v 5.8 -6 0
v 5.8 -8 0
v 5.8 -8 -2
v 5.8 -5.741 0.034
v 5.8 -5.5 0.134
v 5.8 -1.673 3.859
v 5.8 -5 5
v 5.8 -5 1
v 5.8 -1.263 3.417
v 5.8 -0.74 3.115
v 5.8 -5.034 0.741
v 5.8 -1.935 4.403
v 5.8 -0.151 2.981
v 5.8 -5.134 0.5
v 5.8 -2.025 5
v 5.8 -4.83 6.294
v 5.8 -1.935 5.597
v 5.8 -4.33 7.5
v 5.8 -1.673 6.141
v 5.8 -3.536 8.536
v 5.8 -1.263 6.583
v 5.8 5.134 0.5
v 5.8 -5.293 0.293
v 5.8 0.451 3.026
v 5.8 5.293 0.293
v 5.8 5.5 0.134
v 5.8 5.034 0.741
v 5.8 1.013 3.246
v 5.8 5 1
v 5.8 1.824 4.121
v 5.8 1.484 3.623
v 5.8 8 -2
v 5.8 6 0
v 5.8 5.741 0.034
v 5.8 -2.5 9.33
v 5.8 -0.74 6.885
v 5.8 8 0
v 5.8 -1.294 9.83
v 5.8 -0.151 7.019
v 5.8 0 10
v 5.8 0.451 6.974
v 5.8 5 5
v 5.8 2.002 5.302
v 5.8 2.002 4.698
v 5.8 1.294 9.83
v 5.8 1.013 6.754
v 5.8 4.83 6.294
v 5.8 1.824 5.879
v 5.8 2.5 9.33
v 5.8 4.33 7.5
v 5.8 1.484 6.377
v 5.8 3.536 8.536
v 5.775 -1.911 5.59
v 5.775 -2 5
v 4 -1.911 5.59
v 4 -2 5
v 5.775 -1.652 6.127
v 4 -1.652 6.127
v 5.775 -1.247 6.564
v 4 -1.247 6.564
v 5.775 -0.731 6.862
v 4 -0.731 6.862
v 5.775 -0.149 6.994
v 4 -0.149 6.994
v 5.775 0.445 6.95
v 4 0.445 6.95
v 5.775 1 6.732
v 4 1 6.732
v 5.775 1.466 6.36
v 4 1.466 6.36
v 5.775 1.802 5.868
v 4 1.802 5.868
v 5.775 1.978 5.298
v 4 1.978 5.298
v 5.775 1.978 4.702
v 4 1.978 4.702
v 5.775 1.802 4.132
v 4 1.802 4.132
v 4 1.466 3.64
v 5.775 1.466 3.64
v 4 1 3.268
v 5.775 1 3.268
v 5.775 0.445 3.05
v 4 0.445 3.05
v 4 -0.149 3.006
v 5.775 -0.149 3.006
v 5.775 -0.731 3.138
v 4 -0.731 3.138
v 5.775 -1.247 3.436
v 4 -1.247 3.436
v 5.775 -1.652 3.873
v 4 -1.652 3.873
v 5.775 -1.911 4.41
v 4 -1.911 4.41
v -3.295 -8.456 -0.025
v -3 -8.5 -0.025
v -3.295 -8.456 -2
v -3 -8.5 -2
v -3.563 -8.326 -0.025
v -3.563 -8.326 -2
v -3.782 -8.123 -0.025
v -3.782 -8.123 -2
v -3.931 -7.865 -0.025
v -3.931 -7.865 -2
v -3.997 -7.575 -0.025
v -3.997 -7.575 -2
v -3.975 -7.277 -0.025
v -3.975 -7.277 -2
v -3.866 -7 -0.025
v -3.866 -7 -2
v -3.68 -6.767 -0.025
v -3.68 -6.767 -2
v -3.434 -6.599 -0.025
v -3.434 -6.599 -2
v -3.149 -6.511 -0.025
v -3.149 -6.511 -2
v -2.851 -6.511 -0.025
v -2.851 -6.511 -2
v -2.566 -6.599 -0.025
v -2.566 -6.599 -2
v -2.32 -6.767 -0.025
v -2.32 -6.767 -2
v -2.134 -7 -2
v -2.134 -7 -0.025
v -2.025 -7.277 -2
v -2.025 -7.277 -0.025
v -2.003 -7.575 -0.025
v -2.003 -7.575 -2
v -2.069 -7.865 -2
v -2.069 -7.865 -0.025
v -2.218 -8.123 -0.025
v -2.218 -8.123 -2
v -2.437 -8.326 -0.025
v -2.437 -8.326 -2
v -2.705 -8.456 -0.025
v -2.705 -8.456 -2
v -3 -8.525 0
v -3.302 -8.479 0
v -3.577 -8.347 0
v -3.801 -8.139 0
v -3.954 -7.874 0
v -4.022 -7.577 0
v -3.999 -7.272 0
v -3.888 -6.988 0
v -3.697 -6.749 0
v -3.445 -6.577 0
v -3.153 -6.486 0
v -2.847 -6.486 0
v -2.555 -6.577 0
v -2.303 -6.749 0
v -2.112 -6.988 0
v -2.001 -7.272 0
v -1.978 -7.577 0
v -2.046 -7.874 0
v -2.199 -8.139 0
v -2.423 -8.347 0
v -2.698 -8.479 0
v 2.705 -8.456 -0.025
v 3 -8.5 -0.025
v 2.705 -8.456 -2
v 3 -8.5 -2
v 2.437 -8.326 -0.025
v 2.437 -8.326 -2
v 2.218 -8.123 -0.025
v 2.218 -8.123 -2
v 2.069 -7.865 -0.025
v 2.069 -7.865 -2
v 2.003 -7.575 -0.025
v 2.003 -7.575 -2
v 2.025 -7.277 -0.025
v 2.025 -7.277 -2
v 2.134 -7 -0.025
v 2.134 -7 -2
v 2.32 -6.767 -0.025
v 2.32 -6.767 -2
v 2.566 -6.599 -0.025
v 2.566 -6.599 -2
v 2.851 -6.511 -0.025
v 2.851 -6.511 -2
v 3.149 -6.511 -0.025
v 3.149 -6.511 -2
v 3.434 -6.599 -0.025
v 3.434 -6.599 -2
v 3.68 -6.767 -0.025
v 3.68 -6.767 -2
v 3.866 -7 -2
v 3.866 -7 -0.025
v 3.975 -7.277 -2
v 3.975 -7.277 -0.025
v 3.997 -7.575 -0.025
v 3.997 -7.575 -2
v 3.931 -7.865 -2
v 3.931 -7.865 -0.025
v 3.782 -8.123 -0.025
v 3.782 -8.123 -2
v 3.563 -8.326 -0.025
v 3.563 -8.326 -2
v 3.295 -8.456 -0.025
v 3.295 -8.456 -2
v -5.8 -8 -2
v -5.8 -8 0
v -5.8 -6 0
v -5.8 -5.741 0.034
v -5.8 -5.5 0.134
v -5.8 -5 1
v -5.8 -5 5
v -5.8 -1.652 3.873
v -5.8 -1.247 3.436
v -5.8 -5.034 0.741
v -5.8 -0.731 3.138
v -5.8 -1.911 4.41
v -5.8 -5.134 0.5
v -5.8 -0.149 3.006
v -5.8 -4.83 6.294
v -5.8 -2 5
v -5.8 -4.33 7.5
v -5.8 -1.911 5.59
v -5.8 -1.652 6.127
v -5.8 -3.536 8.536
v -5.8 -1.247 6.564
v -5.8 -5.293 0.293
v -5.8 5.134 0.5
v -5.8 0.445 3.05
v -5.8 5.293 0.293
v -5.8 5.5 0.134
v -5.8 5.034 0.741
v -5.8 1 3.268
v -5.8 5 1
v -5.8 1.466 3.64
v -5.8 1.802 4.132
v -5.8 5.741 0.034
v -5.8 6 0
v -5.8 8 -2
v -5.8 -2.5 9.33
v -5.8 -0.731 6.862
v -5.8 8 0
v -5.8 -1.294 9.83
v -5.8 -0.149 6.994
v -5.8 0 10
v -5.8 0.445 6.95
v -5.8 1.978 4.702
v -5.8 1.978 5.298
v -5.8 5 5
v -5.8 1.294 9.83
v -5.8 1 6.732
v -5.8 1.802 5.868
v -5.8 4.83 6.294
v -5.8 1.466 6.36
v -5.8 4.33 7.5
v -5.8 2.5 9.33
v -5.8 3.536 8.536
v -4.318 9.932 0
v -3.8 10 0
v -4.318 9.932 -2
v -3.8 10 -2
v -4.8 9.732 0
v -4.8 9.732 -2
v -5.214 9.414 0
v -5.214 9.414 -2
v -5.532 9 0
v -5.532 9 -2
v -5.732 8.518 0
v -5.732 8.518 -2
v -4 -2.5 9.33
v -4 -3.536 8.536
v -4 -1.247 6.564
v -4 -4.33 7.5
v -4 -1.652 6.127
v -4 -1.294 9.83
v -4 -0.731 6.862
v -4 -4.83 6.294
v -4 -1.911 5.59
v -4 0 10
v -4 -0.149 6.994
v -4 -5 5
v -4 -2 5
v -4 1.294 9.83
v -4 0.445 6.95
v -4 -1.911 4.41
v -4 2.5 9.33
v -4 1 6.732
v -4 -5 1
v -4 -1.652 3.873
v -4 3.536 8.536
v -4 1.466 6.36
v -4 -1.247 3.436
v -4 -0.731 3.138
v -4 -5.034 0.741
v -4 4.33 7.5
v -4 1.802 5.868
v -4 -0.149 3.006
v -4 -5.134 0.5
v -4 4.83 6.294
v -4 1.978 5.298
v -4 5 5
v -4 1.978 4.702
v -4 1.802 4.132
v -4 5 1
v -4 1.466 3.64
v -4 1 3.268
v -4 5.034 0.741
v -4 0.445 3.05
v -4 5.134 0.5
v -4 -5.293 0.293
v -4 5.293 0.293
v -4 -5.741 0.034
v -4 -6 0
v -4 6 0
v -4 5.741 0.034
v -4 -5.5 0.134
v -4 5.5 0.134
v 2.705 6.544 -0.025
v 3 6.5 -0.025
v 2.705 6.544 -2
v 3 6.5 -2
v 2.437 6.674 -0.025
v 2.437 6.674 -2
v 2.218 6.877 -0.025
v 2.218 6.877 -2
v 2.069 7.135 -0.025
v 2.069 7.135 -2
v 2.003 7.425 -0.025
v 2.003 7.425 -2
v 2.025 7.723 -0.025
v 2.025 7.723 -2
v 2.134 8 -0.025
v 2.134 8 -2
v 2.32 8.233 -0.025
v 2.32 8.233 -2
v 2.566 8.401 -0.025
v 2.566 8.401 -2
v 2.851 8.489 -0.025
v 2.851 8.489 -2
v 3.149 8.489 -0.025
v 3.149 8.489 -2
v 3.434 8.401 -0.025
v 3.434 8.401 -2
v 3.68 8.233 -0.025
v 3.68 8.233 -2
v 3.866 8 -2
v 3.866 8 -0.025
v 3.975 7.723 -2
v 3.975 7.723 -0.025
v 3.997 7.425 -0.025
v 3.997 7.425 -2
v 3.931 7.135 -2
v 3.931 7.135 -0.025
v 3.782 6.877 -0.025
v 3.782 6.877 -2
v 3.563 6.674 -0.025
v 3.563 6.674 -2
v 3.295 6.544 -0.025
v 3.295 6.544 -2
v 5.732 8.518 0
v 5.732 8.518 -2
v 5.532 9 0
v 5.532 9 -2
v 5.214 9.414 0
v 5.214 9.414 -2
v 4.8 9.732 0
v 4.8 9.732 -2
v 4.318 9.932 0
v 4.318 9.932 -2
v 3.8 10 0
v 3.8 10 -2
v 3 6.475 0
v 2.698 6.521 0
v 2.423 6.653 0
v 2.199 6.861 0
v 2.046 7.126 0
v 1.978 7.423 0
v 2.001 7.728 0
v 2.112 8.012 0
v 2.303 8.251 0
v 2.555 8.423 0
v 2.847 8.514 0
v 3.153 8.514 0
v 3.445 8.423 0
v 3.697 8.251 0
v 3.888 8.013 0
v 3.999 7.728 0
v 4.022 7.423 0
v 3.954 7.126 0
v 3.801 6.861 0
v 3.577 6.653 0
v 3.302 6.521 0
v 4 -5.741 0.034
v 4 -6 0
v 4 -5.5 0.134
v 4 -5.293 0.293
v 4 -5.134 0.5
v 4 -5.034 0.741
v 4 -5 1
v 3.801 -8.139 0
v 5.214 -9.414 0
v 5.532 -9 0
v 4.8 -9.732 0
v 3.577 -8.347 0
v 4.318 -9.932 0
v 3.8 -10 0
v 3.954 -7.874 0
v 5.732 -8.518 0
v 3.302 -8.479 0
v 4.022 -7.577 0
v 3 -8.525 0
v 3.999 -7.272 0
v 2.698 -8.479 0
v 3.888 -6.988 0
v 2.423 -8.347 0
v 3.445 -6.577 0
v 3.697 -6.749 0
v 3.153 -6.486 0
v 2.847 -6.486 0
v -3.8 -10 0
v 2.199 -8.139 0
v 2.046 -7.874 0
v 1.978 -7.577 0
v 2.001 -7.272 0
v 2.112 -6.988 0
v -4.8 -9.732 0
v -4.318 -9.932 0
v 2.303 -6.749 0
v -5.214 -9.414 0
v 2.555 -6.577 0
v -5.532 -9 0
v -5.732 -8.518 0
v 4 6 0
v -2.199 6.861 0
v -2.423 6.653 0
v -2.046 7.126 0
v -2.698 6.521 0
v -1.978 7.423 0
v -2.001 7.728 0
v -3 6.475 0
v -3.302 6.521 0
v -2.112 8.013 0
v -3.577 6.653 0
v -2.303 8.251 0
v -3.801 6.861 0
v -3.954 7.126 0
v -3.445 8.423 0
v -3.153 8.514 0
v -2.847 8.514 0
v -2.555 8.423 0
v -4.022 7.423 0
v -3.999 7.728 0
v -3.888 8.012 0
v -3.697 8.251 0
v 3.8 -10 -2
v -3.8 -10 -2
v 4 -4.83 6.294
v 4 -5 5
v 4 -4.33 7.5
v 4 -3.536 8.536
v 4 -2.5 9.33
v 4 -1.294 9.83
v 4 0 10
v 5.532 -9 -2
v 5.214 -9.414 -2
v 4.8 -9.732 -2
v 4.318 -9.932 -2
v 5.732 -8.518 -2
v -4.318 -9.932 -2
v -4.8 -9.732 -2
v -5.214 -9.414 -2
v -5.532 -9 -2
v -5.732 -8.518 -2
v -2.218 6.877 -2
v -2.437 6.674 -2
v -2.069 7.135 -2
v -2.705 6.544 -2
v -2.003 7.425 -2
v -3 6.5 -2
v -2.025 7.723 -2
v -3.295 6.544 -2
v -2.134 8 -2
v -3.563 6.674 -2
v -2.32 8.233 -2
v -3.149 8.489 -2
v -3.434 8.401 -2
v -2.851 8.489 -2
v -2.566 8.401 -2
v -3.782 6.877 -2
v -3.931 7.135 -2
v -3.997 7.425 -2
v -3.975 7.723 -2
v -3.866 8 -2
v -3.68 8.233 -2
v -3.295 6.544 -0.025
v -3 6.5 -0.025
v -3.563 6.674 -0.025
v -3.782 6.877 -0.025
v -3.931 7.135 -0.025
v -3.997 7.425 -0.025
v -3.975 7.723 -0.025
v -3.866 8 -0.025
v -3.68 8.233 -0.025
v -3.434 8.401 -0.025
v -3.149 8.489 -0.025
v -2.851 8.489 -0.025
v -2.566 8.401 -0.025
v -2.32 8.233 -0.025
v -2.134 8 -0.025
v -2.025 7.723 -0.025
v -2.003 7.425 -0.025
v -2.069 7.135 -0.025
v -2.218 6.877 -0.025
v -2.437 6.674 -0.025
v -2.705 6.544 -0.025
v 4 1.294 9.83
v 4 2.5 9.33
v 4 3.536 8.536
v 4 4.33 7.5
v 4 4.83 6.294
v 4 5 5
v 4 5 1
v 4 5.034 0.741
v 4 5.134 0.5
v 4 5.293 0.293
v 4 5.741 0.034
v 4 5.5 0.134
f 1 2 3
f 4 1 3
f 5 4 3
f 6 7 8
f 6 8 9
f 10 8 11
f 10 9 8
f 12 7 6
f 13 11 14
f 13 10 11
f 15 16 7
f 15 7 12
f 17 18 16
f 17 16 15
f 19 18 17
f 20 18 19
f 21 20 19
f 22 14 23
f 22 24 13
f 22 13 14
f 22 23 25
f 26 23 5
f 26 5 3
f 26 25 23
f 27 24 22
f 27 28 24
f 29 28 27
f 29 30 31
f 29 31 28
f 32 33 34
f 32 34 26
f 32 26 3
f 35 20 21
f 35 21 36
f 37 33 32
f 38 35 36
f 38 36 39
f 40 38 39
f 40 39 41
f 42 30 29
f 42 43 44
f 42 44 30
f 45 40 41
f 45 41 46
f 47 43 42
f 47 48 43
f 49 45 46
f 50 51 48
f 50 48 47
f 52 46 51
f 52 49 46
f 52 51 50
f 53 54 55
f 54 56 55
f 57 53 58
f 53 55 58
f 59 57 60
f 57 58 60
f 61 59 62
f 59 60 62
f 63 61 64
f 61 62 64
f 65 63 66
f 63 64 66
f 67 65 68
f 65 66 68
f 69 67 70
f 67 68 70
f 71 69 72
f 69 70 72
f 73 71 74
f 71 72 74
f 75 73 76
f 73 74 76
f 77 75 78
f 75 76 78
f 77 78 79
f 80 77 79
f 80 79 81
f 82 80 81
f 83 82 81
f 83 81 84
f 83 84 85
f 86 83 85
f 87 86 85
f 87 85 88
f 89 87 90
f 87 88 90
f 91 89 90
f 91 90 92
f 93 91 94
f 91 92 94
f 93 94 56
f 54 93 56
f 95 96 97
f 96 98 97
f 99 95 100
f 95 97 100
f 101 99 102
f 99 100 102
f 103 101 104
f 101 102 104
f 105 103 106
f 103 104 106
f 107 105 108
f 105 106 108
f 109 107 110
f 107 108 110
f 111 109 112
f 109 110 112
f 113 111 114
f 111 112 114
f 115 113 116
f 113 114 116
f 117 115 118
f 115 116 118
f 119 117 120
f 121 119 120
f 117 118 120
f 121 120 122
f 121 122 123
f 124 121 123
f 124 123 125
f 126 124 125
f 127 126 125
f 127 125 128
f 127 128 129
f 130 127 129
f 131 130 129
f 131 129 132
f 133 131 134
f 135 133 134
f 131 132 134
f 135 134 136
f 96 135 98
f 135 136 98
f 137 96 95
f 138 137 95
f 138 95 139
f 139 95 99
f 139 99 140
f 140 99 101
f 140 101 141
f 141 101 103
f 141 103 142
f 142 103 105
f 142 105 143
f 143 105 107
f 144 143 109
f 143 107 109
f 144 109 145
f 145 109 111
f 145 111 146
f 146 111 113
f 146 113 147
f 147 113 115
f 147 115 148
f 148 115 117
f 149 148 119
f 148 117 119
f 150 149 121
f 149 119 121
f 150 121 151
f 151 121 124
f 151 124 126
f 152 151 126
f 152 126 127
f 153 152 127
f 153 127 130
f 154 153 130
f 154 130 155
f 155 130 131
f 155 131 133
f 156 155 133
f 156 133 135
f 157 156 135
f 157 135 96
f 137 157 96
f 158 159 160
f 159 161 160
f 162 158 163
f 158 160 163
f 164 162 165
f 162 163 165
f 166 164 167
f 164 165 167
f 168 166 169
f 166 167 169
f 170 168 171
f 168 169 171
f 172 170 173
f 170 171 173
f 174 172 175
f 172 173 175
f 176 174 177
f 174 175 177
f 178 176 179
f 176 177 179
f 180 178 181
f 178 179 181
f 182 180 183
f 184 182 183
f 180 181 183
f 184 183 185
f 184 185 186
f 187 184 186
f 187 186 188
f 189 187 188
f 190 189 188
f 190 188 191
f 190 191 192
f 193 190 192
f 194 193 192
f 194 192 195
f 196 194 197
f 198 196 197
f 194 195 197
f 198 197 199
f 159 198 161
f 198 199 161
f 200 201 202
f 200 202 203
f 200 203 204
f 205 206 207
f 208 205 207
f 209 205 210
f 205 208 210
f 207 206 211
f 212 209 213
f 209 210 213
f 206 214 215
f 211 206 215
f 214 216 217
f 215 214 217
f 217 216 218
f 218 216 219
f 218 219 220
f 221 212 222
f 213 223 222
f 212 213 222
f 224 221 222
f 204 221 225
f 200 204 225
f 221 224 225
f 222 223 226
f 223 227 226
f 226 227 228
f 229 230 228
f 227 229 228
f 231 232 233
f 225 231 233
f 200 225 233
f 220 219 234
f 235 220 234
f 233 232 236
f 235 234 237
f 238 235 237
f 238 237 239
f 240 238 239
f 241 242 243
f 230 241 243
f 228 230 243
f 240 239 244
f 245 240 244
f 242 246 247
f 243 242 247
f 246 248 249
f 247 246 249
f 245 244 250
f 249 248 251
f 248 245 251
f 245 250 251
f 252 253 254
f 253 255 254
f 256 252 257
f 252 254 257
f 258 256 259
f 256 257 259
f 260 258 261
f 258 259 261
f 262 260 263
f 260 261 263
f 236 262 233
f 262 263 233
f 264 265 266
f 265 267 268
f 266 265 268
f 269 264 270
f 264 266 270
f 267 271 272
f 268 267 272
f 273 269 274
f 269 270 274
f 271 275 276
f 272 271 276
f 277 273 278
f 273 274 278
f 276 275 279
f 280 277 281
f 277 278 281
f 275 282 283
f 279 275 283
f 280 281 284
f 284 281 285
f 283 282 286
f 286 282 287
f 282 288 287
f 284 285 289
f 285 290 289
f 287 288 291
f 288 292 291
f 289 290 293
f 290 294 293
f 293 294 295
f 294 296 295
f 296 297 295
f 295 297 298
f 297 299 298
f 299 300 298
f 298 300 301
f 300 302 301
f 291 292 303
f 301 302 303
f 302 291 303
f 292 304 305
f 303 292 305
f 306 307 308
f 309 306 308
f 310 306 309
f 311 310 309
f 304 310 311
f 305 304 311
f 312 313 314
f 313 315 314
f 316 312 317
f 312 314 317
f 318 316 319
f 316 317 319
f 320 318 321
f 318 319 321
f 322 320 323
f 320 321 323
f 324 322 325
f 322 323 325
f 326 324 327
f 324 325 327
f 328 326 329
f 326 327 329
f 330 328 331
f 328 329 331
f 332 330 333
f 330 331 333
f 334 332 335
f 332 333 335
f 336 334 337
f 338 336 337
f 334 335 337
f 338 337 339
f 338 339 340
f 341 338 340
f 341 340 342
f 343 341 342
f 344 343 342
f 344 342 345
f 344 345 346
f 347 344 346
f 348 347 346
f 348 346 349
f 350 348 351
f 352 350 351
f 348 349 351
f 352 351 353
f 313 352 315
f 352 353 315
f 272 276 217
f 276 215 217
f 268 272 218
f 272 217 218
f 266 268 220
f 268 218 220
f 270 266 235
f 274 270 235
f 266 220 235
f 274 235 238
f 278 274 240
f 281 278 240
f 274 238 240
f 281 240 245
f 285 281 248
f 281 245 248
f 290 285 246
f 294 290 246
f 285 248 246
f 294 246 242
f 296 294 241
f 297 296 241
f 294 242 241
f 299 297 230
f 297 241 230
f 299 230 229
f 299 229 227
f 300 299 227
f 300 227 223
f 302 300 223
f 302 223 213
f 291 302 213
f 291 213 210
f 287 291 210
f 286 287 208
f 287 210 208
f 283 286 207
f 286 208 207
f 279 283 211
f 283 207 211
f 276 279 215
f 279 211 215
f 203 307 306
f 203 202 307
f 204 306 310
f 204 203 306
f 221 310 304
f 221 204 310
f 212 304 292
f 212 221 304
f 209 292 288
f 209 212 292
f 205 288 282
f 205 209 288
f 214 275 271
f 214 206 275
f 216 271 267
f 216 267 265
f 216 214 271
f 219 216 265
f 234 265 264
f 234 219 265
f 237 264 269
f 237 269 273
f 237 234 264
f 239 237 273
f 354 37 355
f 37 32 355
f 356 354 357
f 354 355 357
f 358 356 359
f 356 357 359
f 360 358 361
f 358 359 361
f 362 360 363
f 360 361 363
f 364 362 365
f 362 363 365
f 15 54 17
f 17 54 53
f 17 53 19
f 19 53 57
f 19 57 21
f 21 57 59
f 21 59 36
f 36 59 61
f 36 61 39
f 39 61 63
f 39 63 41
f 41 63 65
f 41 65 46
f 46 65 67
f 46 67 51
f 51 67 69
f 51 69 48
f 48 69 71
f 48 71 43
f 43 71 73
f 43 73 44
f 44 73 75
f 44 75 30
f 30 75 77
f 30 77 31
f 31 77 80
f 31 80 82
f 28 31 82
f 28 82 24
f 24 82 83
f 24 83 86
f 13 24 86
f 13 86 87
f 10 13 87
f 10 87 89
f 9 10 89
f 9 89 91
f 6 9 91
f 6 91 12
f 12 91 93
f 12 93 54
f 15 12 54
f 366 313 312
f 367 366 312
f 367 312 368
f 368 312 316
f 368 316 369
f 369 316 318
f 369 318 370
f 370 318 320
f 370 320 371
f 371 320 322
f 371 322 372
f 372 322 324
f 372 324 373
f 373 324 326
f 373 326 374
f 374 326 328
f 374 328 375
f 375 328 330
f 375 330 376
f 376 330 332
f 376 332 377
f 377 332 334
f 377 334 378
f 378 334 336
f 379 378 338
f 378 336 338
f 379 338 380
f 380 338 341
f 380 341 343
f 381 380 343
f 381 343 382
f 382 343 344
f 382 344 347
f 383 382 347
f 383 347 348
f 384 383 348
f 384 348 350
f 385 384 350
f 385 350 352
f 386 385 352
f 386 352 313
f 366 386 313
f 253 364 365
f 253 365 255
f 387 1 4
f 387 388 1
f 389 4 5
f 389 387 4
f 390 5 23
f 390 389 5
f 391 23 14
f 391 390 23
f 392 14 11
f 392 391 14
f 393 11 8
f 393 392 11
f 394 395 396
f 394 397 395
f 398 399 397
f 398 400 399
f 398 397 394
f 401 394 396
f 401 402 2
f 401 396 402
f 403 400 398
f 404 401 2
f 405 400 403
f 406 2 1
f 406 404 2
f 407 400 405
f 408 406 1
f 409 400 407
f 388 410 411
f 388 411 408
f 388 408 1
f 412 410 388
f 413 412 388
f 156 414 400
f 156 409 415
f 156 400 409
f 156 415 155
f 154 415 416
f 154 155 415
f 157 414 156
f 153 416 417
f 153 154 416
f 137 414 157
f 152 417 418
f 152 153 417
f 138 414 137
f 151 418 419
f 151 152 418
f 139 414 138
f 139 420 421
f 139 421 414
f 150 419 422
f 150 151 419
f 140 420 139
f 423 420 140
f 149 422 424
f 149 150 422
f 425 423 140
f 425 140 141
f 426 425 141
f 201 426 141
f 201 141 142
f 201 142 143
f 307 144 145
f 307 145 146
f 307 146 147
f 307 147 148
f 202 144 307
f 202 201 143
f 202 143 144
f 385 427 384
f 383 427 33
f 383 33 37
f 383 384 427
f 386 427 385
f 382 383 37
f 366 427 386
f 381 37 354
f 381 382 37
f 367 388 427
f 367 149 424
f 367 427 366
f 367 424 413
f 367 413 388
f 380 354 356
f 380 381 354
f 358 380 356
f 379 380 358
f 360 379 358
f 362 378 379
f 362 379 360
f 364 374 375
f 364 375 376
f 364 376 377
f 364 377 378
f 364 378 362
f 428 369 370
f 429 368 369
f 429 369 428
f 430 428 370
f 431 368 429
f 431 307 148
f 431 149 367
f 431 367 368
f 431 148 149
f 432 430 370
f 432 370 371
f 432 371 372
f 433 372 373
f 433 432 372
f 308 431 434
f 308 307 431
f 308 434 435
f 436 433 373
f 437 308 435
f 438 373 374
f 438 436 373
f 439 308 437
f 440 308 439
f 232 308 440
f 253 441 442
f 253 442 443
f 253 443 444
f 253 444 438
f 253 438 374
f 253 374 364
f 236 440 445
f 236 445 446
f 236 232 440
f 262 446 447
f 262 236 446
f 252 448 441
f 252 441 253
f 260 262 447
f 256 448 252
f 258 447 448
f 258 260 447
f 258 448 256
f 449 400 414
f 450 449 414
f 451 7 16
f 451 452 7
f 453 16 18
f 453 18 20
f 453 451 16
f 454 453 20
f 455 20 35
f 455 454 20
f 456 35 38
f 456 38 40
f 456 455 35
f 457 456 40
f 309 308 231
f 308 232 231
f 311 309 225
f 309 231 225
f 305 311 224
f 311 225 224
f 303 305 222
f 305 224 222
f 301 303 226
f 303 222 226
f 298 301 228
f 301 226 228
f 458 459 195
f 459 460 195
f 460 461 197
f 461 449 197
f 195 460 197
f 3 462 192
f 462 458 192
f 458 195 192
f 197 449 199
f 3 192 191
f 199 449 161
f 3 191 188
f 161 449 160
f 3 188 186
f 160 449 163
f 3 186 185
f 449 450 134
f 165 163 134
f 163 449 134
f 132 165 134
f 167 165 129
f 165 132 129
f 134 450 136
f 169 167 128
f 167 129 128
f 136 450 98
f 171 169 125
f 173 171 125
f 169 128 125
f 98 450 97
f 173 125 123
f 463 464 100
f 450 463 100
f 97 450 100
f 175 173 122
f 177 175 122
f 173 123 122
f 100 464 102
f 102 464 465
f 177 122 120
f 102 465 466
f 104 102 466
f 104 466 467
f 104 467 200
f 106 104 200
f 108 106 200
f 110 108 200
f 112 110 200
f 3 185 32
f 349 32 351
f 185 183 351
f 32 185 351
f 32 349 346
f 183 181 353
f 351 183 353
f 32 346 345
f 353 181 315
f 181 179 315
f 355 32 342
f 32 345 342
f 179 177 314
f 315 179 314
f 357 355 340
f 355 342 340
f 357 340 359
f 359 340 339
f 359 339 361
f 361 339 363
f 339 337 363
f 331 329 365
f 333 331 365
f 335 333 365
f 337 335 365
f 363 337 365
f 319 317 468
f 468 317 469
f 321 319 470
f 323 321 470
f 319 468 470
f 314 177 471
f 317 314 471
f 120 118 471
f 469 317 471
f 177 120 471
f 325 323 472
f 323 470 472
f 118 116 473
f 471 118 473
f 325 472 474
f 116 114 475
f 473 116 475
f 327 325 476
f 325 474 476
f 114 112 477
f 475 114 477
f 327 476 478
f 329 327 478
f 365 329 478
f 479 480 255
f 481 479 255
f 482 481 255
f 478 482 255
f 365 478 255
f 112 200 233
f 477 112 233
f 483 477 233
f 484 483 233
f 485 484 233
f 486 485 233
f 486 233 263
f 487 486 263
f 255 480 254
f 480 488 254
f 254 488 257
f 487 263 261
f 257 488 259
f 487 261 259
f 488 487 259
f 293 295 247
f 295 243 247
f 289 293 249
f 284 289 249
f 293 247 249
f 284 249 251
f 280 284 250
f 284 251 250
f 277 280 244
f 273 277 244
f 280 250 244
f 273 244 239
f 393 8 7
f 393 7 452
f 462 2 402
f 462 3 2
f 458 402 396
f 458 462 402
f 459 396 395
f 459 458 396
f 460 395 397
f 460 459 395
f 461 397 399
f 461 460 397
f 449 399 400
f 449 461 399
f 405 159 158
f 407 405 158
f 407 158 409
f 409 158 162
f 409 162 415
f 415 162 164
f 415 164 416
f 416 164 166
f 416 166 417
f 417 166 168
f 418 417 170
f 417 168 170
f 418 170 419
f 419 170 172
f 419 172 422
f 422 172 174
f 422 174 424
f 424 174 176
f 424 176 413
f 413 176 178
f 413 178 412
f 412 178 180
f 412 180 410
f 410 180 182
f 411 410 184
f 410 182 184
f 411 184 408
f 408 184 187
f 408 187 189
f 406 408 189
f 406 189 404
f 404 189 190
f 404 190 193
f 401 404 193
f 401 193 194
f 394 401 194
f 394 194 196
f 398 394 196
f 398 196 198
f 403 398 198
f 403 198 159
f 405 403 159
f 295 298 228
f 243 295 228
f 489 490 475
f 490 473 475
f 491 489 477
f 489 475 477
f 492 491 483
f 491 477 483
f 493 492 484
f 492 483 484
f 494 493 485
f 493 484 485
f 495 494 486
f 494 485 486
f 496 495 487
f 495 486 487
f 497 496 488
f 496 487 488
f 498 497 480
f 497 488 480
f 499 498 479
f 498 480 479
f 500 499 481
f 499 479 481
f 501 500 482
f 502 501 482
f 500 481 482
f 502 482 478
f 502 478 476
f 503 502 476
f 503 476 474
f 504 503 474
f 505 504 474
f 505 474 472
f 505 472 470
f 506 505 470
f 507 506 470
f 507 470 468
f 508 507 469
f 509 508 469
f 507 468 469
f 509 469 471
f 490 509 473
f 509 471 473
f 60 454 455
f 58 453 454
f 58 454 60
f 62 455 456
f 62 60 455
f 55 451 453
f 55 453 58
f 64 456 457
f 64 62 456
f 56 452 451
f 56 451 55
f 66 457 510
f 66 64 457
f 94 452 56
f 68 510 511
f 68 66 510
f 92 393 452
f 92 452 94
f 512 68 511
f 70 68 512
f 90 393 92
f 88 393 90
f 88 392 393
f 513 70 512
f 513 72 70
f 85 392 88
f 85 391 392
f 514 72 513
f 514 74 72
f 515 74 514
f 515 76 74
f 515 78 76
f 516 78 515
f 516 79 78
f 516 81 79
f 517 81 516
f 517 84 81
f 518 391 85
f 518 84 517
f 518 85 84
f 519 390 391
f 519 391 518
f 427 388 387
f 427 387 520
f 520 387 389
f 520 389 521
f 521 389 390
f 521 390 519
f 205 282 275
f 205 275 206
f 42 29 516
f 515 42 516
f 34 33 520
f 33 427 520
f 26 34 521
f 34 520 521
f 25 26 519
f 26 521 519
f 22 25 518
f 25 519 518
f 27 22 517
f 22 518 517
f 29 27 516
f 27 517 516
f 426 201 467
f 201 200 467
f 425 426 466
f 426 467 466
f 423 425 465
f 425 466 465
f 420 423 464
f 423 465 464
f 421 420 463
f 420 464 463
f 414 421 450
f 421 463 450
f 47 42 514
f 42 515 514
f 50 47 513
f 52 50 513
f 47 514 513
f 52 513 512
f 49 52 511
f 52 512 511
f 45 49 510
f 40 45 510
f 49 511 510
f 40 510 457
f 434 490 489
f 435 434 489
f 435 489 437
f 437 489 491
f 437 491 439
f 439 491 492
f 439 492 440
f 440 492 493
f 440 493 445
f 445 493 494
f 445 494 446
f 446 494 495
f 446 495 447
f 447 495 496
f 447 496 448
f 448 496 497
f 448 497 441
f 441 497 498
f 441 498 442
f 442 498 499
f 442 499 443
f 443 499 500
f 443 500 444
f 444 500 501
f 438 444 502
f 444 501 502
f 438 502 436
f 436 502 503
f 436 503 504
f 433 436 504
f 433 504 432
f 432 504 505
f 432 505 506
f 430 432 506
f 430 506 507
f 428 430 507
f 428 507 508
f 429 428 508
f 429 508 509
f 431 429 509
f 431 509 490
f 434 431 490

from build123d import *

# Parameters (mm, degrees)
SKETCH1_W                       = 20
SKETCH1_H                       = 11.6
BOSS_EXTRUDE1_DEPTH             = 2
SKETCH2_W                       = 10
SKETCH2_H                       = 1.8
BOSS_EXTRUDE2_DEPTH             = 10
FILLET1_R                       = 5
F_4_0MM_DOWEL_HOLE1_D           = 4
F_4_0MM_DOWEL_HOLE1_CSINK_D     = 4.05
F_4_0MM_DOWEL_HOLE1_CSINK_ANGLE = 90
F_2_0MM_DOWEL_HOLE1_D           = 2
F_2_0MM_DOWEL_HOLE1_CSINK_D     = 2.05
F_2_0MM_DOWEL_HOLE1_CSINK_ANGLE = 90
FILLET2_R                       = 2
FILLET3_R                       = 1


with BuildPart() as part:
    # Sketch1 → Boss-Extrude1 (new body)
    with BuildSketch(Plane(origin=(0, 0, 0), x_dir=(0, 1, 0), z_dir=(0, 0, 1))):
        Rectangle(SKETCH1_W, SKETCH1_H)
    extrude(amount=-BOSS_EXTRUDE1_DEPTH)

    # Sketch2 → Boss-Extrude2 (add)
    with BuildSketch(Plane(origin=(0, 0, 0), x_dir=(0, 1, 0), z_dir=(0, 0, 1))):
        with Locations((0, 4.9)):
            Rectangle(SKETCH2_W, SKETCH2_H)
        with Locations((0, -4.9)):
            Rectangle(SKETCH2_W, SKETCH2_H)
    extrude(amount=BOSS_EXTRUDE2_DEPTH)

    # Fillet1
    fillet1_edges = [part.edges().sort_by_distance(p)[0] for p in [
        (4.9, 5, 10),
        (4.9, -5, 10),
        (-4.9, 5, 10),
        (-4.9, -5, 10),
    ]]
    fillet(fillet1_edges, radius=FILLET1_R - 0.0001)  # a hair under: the kernel refuses the full size

    # Ø4.0mm Dowel Hole1 (through all)
    with Locations(Plane.YZ.offset(5.8)):
        with Locations((0, 5)):
            CounterSinkHole(F_4_0MM_DOWEL_HOLE1_D / 2, F_4_0MM_DOWEL_HOLE1_CSINK_D / 2, counter_sink_angle=F_4_0MM_DOWEL_HOLE1_CSINK_ANGLE)

    # Ø2.0mm Dowel Hole1 (through all)
    with Locations(Plane(origin=(0, 0, 0), x_dir=(0, 1, 0), z_dir=(0, 0, 1))):
        with Locations((7.5, -3), (-7.5, 3), (-7.5, -3), (7.5, 3)):
            CounterSinkHole(F_2_0MM_DOWEL_HOLE1_D / 2, F_2_0MM_DOWEL_HOLE1_CSINK_D / 2, counter_sink_angle=F_2_0MM_DOWEL_HOLE1_CSINK_ANGLE)

    # Fillet2
    fillet2_edges = [part.edges().sort_by_distance(p)[0] for p in [
        (-5.8, -10, -1),
        (-5.8, 10, -1),
        (5.8, 10, -1),
        (5.8, -10, -1),
    ]]
    fillet(fillet2_edges, radius=FILLET2_R)

    # Fillet3
    fillet3_edges = [part.edges().sort_by_distance(p)[0] for p in [
        (-4.9, -5, 0),
        (-4.9, 5, 0),
        (4.9, -5, 0),
        (4.9, 5, 0),
    ]]
    fillet(fillet3_edges, radius=FILLET3_R)


solid = part.part
